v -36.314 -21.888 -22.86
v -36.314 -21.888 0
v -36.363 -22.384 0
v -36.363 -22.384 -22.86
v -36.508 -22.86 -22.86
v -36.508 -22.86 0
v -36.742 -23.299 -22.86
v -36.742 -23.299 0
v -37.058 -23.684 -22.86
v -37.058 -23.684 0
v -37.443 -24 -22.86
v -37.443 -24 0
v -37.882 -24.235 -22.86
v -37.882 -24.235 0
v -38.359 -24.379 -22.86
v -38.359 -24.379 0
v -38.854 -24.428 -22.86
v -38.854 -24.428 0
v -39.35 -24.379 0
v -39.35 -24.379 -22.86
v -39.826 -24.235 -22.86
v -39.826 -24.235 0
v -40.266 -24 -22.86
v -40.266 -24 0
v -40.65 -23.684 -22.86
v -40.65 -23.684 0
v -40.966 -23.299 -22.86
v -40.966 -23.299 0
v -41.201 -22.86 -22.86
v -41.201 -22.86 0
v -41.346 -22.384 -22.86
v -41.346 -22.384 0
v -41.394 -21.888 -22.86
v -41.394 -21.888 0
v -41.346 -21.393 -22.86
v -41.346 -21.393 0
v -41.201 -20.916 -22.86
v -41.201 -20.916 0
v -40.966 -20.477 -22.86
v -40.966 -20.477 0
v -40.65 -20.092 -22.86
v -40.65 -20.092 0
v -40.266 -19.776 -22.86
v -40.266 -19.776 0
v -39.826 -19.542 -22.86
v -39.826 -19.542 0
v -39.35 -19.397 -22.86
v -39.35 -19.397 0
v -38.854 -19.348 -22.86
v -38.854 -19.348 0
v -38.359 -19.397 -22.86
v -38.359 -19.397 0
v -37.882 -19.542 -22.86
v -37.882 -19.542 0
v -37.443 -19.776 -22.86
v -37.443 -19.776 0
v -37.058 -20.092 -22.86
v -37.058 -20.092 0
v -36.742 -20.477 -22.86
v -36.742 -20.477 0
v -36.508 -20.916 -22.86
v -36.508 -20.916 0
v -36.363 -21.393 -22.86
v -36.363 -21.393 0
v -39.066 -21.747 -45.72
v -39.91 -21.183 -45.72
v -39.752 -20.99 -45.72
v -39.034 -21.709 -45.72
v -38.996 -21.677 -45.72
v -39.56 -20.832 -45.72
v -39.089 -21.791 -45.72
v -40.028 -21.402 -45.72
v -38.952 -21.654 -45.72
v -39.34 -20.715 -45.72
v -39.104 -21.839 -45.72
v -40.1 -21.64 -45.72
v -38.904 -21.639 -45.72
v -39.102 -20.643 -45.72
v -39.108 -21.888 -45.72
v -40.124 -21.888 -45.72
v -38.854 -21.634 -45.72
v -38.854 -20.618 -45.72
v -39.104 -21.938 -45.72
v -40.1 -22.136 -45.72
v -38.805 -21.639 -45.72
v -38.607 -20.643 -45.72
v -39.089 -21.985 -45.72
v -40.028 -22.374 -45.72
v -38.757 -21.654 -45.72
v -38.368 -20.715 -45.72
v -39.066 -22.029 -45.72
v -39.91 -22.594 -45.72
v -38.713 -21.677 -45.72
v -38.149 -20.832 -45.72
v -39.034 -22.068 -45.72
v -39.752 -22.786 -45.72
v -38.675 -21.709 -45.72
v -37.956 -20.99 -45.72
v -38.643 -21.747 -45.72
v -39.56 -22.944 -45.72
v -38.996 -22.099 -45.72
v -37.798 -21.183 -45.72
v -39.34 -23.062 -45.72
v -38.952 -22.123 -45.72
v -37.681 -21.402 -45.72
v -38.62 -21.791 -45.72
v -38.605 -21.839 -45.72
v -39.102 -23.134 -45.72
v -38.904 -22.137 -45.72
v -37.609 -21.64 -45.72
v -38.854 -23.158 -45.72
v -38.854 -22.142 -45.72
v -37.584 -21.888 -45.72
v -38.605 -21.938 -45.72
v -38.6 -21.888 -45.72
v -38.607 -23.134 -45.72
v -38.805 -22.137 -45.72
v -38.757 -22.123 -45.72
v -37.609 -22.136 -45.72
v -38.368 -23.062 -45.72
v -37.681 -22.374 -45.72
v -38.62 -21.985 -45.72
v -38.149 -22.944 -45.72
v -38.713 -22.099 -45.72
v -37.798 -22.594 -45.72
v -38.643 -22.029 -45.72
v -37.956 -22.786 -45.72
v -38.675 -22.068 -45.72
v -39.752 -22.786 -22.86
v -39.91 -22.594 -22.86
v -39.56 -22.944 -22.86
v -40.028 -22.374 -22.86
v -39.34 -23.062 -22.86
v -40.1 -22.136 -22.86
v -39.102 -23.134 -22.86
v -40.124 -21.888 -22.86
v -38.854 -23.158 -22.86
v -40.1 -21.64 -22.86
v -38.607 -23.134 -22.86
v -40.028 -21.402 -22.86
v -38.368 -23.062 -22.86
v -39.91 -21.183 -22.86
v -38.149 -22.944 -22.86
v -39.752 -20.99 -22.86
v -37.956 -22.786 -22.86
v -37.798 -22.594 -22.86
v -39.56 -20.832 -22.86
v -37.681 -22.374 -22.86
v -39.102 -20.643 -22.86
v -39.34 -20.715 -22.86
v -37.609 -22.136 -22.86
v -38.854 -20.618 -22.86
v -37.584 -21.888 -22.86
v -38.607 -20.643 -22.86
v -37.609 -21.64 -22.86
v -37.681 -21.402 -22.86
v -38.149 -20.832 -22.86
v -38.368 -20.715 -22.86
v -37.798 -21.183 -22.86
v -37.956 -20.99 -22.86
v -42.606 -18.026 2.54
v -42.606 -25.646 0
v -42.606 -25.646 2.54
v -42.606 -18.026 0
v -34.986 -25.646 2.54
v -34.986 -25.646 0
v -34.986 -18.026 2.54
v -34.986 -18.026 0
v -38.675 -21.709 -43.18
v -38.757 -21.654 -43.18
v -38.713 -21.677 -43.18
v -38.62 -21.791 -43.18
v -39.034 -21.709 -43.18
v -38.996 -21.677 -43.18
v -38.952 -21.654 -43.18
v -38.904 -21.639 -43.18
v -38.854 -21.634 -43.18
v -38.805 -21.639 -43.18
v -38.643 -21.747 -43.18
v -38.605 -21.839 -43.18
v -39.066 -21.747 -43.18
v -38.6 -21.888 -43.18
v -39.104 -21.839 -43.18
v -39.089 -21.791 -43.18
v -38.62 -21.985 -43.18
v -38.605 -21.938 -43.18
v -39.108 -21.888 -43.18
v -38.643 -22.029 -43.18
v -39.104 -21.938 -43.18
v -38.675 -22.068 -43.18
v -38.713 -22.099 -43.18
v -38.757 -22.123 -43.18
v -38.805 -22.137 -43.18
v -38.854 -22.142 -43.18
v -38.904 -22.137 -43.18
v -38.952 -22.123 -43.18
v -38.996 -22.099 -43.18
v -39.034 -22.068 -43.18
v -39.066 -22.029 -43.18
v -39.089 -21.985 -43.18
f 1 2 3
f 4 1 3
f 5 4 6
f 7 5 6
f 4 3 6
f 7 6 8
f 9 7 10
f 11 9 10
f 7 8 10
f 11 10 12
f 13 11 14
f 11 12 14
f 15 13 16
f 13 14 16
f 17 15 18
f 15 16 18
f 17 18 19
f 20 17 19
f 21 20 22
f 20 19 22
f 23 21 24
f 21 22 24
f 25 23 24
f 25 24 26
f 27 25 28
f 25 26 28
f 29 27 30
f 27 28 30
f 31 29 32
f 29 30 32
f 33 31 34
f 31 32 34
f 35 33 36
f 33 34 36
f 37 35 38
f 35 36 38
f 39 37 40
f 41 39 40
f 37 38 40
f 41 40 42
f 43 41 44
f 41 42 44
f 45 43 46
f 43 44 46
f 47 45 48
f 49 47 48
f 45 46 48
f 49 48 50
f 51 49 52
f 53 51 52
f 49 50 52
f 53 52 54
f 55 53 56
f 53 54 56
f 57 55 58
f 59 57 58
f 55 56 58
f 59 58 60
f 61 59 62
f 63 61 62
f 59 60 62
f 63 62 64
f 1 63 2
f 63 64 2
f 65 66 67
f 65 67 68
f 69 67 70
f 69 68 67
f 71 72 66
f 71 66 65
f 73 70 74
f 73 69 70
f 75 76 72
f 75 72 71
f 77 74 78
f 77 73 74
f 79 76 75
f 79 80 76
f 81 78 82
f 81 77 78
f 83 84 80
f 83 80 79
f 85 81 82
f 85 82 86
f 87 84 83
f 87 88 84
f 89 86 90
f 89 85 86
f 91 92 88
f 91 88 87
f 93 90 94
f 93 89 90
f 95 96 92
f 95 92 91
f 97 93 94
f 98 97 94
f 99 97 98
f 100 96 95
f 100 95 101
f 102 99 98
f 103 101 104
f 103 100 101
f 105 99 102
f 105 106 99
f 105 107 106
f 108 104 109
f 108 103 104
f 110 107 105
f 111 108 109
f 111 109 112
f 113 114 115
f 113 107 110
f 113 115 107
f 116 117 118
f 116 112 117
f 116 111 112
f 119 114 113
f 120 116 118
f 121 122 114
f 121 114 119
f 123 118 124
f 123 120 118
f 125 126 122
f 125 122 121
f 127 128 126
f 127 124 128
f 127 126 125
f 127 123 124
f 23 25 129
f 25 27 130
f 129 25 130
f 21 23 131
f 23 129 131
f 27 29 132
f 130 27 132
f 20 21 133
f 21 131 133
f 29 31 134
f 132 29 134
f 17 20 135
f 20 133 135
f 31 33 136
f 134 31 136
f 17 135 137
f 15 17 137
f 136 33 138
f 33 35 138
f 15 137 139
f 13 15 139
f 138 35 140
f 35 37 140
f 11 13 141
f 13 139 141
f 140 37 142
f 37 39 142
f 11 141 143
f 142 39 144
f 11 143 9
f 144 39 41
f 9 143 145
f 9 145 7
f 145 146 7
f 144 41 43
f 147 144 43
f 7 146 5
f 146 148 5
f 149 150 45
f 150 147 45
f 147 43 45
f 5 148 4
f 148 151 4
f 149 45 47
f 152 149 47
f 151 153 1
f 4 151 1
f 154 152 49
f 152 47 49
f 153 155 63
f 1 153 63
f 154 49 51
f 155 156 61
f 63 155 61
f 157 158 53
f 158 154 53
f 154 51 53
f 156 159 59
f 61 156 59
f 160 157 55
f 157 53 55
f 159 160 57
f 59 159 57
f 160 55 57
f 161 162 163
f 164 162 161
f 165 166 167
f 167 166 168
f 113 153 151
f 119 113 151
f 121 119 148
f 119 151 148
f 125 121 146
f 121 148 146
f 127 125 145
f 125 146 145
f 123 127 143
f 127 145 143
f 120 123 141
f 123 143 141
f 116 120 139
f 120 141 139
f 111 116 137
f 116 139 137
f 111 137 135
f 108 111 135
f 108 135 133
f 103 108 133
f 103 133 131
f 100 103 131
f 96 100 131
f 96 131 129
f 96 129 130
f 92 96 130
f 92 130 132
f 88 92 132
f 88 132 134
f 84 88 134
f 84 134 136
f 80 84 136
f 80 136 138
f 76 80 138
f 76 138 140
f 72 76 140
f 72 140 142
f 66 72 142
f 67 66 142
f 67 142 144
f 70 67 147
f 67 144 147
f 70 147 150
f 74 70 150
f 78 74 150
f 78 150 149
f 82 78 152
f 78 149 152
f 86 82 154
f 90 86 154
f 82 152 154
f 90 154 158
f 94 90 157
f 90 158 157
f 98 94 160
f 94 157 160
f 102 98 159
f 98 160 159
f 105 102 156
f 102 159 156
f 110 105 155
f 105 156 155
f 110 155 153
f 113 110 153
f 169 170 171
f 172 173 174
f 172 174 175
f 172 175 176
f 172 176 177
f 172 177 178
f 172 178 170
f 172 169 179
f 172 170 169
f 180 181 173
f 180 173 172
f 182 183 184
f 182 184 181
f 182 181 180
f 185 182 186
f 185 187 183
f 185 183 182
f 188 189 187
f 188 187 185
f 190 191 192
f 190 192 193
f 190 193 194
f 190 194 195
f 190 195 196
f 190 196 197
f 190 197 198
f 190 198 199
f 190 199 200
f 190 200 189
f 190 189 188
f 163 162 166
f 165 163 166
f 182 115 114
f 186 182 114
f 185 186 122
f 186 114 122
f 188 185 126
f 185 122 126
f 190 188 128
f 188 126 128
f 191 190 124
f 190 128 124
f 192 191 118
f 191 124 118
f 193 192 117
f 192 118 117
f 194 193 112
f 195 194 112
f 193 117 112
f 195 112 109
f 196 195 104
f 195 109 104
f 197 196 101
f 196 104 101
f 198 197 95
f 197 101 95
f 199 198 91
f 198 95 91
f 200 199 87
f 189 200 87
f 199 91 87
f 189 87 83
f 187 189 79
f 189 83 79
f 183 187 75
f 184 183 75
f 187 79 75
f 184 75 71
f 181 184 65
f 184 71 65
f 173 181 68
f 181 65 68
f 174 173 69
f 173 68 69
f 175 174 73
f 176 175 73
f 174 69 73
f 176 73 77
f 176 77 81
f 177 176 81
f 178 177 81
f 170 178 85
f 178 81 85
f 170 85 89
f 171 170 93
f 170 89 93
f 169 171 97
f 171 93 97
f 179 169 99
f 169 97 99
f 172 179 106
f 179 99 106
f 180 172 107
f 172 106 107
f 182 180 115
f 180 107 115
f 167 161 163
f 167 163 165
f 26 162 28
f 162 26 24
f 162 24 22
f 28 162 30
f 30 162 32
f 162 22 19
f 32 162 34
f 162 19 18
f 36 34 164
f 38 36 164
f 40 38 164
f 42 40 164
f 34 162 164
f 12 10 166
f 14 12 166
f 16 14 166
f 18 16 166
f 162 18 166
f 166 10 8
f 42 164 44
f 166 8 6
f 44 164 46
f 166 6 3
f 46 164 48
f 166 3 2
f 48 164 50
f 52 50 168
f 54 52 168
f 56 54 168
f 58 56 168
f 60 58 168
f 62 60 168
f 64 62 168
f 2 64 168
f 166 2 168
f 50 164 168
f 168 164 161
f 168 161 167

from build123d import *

# Parameters (mm, degrees)
F0_W     = 7.62
F0_H     = 7.62
F1_DEPTH = 2.54
F2_R     = 2.54
F2_R_2   = 1.27
F3_DEPTH = 22.86
F4_DEPTH = 22.86
F5_DEPTH = 45.72
F6_R     = 0.254
F7_DEPTH = 2.54


# Not quite as in the source:
# - a feature names something its author has since deleted; it is built from what else it names


with BuildPart() as f1:
    # F0 (on Top) → F1 (new body)
    with BuildSketch(Plane.XY):
        with Locations((-38.7955456972, -21.8359371471)):
            Rectangle(F0_W, F0_H)
    extrude(amount=F1_DEPTH)

    # F2 (on face) → F3 (join)
    with BuildSketch(Plane(origin=(0, 0, 0), x_dir=(1, 0, 0), z_dir=(0, 0, -1))):
        with Locations((-38.854431361, 21.8882076442)):
            Circle(F2_R)
        with Locations((-38.854431361, 21.8882076442)):
            Circle(F2_R_2, mode=Mode.SUBTRACT)
    extrude(amount=F3_DEPTH)

    # F4 (add): a face of the model
    f4_faces = [f1.faces().sort_by_distance(p)[0] for p in [
        (-38.854431361, -21.8882076442, 0),
    ]]
    extrude(f4_faces, amount=F4_DEPTH)

    # F2 (on face) → F5 (join)
    with BuildSketch(Plane(origin=(0, 0, 0), x_dir=(1, 0, 0), z_dir=(0, 0, -1))):
        with Locations((-38.854431361, 21.8882076442)):
            Circle(F2_R_2)
    extrude(amount=F5_DEPTH)

    # F6 (on face) → F7 (cut)
    with BuildSketch(Plane(origin=(0, 0, -45.72), x_dir=(1, 0, 0), z_dir=(0, 0, -1))):
        with Locations((-38.854431361, 21.8882076442)):
            Circle(F6_R)
    extrude(amount=-F7_DEPTH, mode=Mode.SUBTRACT)


solid = f1.part
